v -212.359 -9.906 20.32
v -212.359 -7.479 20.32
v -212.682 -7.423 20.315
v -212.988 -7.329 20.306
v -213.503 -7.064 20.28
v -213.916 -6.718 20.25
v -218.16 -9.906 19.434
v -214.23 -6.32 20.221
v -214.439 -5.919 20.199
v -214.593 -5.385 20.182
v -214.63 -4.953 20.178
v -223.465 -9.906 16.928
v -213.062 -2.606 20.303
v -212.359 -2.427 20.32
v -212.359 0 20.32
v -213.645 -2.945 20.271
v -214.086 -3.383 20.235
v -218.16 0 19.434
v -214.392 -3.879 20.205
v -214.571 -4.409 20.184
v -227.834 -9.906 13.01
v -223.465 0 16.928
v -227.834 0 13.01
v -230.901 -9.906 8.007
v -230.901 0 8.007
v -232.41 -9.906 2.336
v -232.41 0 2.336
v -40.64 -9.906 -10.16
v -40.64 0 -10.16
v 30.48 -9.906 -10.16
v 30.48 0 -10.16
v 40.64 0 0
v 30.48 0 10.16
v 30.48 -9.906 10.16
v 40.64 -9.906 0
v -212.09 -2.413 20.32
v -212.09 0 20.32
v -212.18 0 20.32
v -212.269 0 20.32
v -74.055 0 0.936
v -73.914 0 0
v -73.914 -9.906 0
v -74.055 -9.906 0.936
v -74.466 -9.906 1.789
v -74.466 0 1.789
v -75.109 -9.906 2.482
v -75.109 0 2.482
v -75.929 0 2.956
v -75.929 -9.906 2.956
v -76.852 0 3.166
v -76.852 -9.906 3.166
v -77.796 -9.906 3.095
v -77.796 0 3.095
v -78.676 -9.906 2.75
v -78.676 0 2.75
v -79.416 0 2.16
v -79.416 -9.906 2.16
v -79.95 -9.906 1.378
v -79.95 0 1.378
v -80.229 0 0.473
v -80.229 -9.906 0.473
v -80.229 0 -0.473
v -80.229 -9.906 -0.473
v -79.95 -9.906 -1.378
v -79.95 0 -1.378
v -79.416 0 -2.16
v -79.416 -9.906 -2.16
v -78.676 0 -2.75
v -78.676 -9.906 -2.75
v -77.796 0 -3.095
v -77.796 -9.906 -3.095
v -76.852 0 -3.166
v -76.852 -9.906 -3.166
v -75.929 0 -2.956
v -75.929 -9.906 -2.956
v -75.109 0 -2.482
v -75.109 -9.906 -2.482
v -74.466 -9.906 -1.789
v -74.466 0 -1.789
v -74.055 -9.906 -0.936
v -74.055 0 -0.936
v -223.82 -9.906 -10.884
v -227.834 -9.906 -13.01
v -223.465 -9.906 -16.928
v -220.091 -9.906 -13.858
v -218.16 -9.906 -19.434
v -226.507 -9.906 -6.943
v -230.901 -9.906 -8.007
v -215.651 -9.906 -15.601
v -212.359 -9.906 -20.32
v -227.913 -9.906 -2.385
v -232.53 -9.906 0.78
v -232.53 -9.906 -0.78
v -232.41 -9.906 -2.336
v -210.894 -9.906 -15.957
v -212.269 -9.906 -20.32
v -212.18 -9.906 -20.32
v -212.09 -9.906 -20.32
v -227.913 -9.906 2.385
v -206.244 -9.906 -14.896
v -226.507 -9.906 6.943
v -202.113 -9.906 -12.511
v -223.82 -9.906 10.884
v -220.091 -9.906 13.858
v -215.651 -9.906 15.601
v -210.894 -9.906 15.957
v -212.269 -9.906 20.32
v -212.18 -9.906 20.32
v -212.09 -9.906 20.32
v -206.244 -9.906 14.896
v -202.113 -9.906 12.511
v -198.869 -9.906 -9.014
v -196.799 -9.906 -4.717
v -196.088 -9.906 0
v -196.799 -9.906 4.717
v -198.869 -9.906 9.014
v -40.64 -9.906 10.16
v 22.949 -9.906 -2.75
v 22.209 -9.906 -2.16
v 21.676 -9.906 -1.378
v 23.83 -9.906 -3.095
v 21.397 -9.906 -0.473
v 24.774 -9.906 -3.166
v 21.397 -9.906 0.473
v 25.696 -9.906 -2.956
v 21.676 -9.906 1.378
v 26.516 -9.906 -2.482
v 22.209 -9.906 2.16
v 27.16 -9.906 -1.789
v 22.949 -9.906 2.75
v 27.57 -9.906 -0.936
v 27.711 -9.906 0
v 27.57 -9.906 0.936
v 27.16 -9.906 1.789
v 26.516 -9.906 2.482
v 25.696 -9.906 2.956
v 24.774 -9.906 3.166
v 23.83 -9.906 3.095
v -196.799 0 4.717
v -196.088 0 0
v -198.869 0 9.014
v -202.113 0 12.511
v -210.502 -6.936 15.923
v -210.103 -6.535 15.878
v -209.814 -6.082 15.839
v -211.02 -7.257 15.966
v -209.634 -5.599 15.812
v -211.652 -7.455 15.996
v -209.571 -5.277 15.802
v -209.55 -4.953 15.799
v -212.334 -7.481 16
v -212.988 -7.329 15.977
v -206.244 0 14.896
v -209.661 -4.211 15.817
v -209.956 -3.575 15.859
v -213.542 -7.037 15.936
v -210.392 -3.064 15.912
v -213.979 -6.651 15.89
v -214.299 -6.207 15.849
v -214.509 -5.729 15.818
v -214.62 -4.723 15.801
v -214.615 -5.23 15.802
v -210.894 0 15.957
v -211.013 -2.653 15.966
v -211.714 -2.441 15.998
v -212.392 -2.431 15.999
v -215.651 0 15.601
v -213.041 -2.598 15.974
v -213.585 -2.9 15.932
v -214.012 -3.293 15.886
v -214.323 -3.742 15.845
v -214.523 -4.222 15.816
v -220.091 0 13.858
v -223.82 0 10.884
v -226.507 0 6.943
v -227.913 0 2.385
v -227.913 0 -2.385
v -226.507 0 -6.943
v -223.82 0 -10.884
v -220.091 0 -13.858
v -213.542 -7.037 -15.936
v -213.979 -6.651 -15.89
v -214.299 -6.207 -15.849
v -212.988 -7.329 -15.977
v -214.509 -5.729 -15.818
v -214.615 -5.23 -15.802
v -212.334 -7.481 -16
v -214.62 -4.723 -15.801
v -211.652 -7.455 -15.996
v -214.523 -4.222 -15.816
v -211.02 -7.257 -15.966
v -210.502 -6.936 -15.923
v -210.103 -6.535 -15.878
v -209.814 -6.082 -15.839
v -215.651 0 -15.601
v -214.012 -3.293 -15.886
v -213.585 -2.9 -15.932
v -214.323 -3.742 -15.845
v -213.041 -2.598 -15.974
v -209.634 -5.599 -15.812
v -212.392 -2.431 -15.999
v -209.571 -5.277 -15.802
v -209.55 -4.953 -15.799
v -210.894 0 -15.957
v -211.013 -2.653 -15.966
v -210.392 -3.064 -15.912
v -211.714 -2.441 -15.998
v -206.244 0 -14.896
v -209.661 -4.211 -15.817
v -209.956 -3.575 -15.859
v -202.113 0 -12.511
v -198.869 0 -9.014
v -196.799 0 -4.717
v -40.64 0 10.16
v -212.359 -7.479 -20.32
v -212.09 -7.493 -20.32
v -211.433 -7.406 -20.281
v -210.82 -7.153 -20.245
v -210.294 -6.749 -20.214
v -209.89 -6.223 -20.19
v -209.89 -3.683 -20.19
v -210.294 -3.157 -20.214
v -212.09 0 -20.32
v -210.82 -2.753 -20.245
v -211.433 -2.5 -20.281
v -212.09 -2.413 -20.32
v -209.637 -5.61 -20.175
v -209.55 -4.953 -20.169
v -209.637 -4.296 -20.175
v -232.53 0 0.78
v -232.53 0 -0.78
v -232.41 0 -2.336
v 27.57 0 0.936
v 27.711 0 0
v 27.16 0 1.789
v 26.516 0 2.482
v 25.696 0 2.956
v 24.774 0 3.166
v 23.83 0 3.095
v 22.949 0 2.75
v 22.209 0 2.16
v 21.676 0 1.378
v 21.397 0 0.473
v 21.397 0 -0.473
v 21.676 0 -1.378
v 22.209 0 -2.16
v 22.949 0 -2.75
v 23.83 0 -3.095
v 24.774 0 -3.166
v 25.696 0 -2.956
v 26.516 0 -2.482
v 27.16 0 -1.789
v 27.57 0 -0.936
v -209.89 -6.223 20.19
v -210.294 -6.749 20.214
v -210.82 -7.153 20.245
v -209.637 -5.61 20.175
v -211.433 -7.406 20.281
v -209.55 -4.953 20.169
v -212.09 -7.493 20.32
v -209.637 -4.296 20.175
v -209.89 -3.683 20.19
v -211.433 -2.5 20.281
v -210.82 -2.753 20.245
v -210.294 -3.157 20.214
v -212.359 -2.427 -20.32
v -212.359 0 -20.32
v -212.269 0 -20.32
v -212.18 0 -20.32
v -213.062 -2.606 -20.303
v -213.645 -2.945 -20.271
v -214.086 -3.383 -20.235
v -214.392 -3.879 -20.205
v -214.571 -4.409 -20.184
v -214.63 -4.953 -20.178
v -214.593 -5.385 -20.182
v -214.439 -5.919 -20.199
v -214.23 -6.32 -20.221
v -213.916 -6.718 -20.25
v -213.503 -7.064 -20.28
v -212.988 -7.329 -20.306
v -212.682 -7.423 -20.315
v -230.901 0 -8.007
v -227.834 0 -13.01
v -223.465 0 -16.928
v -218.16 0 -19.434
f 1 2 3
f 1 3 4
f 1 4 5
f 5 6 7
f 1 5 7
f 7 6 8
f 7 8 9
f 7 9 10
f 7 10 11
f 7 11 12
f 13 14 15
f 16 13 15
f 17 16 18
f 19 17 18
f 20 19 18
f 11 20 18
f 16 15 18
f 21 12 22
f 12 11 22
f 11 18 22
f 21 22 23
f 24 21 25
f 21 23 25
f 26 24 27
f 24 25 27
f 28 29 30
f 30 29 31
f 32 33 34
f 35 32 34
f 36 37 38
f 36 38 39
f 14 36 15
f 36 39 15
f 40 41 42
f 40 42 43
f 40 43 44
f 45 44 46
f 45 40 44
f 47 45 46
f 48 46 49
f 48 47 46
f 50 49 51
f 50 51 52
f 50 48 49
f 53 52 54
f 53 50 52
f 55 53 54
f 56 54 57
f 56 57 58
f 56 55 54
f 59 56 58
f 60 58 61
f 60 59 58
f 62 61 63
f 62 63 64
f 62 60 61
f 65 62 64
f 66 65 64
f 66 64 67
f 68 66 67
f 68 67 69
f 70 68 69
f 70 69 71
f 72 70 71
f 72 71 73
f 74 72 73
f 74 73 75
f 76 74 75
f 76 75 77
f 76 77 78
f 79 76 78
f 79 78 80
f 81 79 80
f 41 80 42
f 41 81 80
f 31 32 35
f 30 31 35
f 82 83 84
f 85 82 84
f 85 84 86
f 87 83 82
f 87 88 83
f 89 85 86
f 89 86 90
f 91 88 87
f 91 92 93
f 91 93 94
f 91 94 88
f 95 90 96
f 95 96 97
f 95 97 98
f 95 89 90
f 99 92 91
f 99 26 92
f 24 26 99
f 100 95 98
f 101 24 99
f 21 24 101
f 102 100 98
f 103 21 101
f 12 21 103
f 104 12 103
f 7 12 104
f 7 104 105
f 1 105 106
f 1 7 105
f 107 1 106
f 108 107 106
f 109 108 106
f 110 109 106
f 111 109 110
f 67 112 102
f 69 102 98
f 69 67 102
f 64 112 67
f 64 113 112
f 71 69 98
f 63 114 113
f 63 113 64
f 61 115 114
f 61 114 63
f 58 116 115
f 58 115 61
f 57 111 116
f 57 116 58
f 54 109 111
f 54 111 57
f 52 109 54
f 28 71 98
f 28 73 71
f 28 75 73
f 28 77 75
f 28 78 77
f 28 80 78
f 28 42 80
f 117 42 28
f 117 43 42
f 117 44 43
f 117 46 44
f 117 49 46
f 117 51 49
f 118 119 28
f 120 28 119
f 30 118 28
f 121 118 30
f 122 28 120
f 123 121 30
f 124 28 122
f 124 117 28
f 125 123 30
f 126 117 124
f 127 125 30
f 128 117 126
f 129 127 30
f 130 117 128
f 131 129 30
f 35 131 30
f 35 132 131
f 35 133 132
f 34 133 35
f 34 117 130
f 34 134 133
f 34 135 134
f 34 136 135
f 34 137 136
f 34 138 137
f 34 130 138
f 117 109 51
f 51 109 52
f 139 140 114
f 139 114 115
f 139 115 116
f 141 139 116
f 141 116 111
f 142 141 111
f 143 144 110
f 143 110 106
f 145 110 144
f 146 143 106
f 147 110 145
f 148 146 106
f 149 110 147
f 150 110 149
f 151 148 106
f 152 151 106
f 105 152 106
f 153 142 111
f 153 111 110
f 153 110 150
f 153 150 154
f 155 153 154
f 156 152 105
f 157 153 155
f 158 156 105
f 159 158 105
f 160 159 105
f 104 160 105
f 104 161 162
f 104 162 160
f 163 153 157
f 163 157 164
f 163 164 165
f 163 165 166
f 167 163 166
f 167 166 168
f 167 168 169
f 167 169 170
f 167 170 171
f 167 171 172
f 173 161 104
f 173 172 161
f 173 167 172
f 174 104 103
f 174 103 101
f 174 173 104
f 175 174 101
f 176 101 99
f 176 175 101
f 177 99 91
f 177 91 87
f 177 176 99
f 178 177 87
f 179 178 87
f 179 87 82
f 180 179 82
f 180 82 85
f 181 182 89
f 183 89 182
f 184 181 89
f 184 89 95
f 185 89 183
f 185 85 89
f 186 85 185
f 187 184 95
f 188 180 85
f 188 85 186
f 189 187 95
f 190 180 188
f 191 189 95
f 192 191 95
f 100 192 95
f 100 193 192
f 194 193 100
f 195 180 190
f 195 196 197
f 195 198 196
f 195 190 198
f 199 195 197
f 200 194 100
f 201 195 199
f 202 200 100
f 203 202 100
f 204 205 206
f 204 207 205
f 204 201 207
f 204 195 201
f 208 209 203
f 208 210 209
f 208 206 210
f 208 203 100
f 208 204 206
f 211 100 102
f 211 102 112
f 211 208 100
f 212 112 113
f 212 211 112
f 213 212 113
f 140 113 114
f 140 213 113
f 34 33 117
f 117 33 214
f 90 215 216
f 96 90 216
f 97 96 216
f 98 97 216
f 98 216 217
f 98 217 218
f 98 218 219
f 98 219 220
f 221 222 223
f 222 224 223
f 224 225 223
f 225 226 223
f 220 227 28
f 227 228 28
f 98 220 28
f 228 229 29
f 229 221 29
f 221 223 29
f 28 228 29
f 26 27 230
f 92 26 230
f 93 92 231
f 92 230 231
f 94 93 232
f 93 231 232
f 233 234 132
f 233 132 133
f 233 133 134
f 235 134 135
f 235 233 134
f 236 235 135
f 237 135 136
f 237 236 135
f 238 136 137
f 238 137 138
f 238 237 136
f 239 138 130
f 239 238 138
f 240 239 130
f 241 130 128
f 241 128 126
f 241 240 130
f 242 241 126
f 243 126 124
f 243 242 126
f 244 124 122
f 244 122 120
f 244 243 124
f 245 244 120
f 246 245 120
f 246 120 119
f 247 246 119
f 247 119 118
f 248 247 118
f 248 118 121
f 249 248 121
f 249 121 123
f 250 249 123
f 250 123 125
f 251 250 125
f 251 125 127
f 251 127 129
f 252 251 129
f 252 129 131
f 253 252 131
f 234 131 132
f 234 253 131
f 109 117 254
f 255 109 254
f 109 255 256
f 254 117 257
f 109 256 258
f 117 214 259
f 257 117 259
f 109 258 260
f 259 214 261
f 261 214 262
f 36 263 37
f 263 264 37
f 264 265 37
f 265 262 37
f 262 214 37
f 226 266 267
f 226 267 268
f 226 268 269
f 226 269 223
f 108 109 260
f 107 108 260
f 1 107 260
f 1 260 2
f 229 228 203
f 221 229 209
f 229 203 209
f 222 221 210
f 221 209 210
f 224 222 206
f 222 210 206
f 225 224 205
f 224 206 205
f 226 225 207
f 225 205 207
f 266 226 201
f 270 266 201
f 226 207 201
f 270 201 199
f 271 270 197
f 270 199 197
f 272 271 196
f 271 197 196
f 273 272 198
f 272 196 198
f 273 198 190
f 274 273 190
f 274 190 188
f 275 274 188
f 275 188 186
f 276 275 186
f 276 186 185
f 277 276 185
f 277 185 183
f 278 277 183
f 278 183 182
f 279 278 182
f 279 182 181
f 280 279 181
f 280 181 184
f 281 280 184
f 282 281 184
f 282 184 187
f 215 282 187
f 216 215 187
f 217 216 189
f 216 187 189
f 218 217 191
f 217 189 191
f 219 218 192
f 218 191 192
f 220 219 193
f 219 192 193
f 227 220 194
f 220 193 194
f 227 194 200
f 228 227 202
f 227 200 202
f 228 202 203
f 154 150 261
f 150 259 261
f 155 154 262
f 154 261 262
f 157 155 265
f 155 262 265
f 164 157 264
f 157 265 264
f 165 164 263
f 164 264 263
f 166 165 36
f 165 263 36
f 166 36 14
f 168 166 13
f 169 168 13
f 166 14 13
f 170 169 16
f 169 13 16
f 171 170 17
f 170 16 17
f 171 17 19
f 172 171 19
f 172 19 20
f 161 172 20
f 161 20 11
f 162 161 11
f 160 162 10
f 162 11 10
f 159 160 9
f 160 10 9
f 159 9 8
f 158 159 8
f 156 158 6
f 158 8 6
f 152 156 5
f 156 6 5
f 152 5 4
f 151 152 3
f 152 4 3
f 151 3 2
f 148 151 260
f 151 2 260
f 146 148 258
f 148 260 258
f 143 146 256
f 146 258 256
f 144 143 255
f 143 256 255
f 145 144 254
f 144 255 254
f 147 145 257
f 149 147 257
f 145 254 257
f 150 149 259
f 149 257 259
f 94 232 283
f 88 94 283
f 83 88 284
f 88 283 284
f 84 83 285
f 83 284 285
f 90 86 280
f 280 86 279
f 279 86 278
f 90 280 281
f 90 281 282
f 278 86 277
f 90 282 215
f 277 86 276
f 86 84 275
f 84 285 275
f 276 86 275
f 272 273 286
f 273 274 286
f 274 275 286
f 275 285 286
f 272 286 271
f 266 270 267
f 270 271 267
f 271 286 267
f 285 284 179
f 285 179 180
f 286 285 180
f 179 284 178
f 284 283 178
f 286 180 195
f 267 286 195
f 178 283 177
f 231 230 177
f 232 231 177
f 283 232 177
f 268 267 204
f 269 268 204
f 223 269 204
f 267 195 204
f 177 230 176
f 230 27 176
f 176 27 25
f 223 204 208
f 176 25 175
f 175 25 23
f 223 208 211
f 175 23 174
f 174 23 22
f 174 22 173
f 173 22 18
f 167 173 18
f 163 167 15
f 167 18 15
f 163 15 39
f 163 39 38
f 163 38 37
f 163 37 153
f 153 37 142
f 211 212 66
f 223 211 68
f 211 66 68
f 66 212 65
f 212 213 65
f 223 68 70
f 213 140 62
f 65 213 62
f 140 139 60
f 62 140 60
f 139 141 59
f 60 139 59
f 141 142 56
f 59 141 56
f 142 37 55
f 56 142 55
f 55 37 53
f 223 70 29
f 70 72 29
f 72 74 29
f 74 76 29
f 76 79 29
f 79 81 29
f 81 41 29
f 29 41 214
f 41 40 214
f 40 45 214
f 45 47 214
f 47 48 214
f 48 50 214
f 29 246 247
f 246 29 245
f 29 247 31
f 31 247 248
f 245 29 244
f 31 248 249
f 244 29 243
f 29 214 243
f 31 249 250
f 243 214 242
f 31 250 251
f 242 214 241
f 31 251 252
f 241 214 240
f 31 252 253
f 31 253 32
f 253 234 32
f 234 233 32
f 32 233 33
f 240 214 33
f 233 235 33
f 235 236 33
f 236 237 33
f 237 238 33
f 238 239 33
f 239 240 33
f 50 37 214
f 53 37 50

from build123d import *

# Parameters (mm, degrees)
F0_R     = 16.002
F0_R_2   = 3.175
F1_DEPTH = 9.906
F3_R     = 16.002
F3_R_2   = 3.175
F4_DEPTH = 9.906
F6_SIZE  = 10.15999
F7_R     = 2.54
F8_DEPTH = 63.5


# Not quite as in the source:
# - a fillet or chamfer is up to 0.001 mm smaller than in the source, because OpenCascade refuses the exact size


with BuildPart() as f1:
    # F0 (on Front) → F1 (new body)
    with BuildSketch(Plane.XZ):
        with BuildLine():
            Line((-40.64, -10.16), (40.64, -10.16))
            Line((40.64, -10.16), (40.64, 10.16))
            Line((40.64, 10.16), (-40.64, 10.16))
            Line((-40.64, 10.16), (-212.09, 20.32))
            Line((-212.09, 20.32), (-212.3586240849, 20.32))
            ThreePointArc((-212.3586240849, 20.32), (-225.7918722454, 15.1275163151), (-232.41, 2.3363307568))
            Line((-232.41, 2.3363307568), (-232.41, -2.3363307568))
            ThreePointArc((-232.41, -2.3363307568), (-225.7918722455, -15.1275163151), (-212.3586240849, -20.32))
            Line((-212.3586240849, -20.32), (-212.09, -20.32))
            Line((-212.09, -20.32), (-40.64, -10.16))
        make_face()
        with Locations((-212.09, 0)):
            Circle(F0_R, mode=Mode.SUBTRACT)
        with Locations((-77.089, 0)):
            Circle(F0_R_2, mode=Mode.SUBTRACT)
        with Locations((24.5364, 0)):
            Circle(F0_R_2, mode=Mode.SUBTRACT)
        with BuildLine():
            ThreePointArc((-212.3586240849, -20.32), (-212.2243120425, -20.320443886), (-212.09, -20.32))
            Line((-212.09, -20.32), (-212.3586240849, -20.32))
        make_face()
        with BuildLine():
            Line((-212.3586240849, 20.32), (-212.09, 20.32))
            ThreePointArc((-212.09, 20.32), (-212.2243120425, 20.320443886), (-212.3586240849, 20.32))
        make_face()
        with BuildLine():
            ThreePointArc((-232.41, 2.3363307568), (-232.5447559285, 0), (-232.41, -2.3363307568))
            Line((-232.41, -2.3363307568), (-232.41, 2.3363307568))
        make_face()
    extrude(amount=F1_DEPTH)

    # F3 (on face) → F4 (join)
    with BuildSketch(Plane.XZ.offset(9.906)):
        with BuildLine():
            ThreePointArc((-212.09, 20.32), (-232.5447559285, 0), (-212.09, -20.32))
            Line((-212.09, -20.32), (-40.64, -10.16))
            Line((-40.64, -10.16), (40.64, -10.16))
            Line((40.64, -10.16), (40.64, 10.16))
            Line((40.64, 10.16), (-40.64, 10.16))
            Line((-40.64, 10.16), (-212.09, 20.32))
        make_face()
        with Locations((-212.09, 0)):
            Circle(F3_R, mode=Mode.SUBTRACT)
        with Locations((-77.089, 0)):
            Circle(F3_R_2, mode=Mode.SUBTRACT)
        with Locations((24.5364, 0)):
            Circle(F3_R_2, mode=Mode.SUBTRACT)
        Polygon((-192.0276897852, 9.9897326363), (-191.4355526853, 11.4626650533), (-190.8434155854, 12.9355974702), (-161.479297027, 1.1308576164), (-159.3415343892, 0.2714505221), (-138.9796634154, 8.3541679114), (-109.9172381334, 0.2630833417), (-106.984711484, 1.0945316722), (-104.048270324, 0.2770158067), (-101.1118291641, -0.5405000589), (-104.0443558136, -1.3719483894), (-106.976882463, -2.2033967199), (-109.913323623, -1.3858808543), (-138.9771856379, -9.6262491233), (-159.3452632945, -1.4380292869), (-161.4867548376, -2.2881020016), (-163.6245174754, -1.4286949073), (-165.7622801132, -0.5692878129), align=None, mode=Mode.SUBTRACT)
        Polygon((-157.2037717514, -0.5879565723), (-159.3452632945, -1.4380292869), (-138.9771856379, -9.6262491233), (-109.913323623, -1.3858808543), (-112.8497647829, -0.5683649888), (-138.8883433663, -7.9509859432), align=None)
        Polygon((-138.9796634154, 8.3541679114), (-159.3415343892, 0.2714505221), (-157.2037717514, -0.5879565723), (-138.8906361201, 6.6815080074), (-112.8497647829, -0.5683649888), (-109.9172381334, 0.2630833417), align=None)
        Polygon((-190.8434155854, 12.9355974702), (-191.4355526853, 11.4626650533), (-163.6207885701, 0.2807849018), (-161.479297027, 1.1308576164), align=None)
        Polygon((-163.6207885701, 0.2807849018), (-191.4355526853, 11.4626650533), (-192.0276897852, 9.9897326363), (-165.7622801132, -0.5692878129), align=None)
        Polygon((-106.9807969735, -0.5544325238), (-109.913323623, -1.3858808543), (-106.976882463, -2.2033967199), (-104.0443558136, -1.3719483894), align=None)
        Polygon((-112.8497647829, -0.5683649888), (-109.913323623, -1.3858808543), (-106.9807969735, -0.5544325238), (-109.9172381334, 0.2630833417), align=None)
        Polygon((-104.048270324, 0.2770158067), (-106.9807969735, -0.5544325238), (-104.0443558136, -1.3719483894), (-101.1118291641, -0.5405000589), align=None)
        Polygon((-106.984711484, 1.0945316722), (-109.9172381334, 0.2630833417), (-106.9807969735, -0.5544325238), (-104.048270324, 0.2770158067), align=None)
        Polygon((-161.479297027, 1.1308576164), (-163.6207885701, 0.2807849018), (-161.4830259323, -0.5786221926), (-159.3415343892, 0.2714505221), align=None)
        Polygon((-161.4830259323, -0.5786221926), (-163.6207885701, 0.2807849018), (-165.7622801132, -0.5692878129), (-163.6245174754, -1.4286949073), align=None)
        Polygon((-159.3415343892, 0.2714505221), (-161.4830259323, -0.5786221926), (-159.3452632945, -1.4380292869), (-157.2037717514, -0.5879565723), align=None)
        Polygon((-159.3452632945, -1.4380292869), (-161.4830259323, -0.5786221926), (-163.6245174754, -1.4286949073), (-161.4867548376, -2.2881020016), align=None)
    extrude(amount=-F4_DEPTH)

    # F6 (size 10.16 in the source; OpenCascade refuses exactly that, so slightly less here)
    f6_edges = [f1.edges().sort_by_distance(p)[0] for p in [
        (40.64, -4.953, -10.16),
        (40.64, -4.953, 10.16),
    ]]
    chamfer(f6_edges, length=F6_SIZE)

    # F7 (on Top) → F8 (cut, symmetric)
    with BuildSketch(Plane.XY):
        with Locations((-212.09, -4.953)):
            Circle(F7_R)
    extrude(amount=F8_DEPTH, both=True, mode=Mode.SUBTRACT)


solid = f1.part
